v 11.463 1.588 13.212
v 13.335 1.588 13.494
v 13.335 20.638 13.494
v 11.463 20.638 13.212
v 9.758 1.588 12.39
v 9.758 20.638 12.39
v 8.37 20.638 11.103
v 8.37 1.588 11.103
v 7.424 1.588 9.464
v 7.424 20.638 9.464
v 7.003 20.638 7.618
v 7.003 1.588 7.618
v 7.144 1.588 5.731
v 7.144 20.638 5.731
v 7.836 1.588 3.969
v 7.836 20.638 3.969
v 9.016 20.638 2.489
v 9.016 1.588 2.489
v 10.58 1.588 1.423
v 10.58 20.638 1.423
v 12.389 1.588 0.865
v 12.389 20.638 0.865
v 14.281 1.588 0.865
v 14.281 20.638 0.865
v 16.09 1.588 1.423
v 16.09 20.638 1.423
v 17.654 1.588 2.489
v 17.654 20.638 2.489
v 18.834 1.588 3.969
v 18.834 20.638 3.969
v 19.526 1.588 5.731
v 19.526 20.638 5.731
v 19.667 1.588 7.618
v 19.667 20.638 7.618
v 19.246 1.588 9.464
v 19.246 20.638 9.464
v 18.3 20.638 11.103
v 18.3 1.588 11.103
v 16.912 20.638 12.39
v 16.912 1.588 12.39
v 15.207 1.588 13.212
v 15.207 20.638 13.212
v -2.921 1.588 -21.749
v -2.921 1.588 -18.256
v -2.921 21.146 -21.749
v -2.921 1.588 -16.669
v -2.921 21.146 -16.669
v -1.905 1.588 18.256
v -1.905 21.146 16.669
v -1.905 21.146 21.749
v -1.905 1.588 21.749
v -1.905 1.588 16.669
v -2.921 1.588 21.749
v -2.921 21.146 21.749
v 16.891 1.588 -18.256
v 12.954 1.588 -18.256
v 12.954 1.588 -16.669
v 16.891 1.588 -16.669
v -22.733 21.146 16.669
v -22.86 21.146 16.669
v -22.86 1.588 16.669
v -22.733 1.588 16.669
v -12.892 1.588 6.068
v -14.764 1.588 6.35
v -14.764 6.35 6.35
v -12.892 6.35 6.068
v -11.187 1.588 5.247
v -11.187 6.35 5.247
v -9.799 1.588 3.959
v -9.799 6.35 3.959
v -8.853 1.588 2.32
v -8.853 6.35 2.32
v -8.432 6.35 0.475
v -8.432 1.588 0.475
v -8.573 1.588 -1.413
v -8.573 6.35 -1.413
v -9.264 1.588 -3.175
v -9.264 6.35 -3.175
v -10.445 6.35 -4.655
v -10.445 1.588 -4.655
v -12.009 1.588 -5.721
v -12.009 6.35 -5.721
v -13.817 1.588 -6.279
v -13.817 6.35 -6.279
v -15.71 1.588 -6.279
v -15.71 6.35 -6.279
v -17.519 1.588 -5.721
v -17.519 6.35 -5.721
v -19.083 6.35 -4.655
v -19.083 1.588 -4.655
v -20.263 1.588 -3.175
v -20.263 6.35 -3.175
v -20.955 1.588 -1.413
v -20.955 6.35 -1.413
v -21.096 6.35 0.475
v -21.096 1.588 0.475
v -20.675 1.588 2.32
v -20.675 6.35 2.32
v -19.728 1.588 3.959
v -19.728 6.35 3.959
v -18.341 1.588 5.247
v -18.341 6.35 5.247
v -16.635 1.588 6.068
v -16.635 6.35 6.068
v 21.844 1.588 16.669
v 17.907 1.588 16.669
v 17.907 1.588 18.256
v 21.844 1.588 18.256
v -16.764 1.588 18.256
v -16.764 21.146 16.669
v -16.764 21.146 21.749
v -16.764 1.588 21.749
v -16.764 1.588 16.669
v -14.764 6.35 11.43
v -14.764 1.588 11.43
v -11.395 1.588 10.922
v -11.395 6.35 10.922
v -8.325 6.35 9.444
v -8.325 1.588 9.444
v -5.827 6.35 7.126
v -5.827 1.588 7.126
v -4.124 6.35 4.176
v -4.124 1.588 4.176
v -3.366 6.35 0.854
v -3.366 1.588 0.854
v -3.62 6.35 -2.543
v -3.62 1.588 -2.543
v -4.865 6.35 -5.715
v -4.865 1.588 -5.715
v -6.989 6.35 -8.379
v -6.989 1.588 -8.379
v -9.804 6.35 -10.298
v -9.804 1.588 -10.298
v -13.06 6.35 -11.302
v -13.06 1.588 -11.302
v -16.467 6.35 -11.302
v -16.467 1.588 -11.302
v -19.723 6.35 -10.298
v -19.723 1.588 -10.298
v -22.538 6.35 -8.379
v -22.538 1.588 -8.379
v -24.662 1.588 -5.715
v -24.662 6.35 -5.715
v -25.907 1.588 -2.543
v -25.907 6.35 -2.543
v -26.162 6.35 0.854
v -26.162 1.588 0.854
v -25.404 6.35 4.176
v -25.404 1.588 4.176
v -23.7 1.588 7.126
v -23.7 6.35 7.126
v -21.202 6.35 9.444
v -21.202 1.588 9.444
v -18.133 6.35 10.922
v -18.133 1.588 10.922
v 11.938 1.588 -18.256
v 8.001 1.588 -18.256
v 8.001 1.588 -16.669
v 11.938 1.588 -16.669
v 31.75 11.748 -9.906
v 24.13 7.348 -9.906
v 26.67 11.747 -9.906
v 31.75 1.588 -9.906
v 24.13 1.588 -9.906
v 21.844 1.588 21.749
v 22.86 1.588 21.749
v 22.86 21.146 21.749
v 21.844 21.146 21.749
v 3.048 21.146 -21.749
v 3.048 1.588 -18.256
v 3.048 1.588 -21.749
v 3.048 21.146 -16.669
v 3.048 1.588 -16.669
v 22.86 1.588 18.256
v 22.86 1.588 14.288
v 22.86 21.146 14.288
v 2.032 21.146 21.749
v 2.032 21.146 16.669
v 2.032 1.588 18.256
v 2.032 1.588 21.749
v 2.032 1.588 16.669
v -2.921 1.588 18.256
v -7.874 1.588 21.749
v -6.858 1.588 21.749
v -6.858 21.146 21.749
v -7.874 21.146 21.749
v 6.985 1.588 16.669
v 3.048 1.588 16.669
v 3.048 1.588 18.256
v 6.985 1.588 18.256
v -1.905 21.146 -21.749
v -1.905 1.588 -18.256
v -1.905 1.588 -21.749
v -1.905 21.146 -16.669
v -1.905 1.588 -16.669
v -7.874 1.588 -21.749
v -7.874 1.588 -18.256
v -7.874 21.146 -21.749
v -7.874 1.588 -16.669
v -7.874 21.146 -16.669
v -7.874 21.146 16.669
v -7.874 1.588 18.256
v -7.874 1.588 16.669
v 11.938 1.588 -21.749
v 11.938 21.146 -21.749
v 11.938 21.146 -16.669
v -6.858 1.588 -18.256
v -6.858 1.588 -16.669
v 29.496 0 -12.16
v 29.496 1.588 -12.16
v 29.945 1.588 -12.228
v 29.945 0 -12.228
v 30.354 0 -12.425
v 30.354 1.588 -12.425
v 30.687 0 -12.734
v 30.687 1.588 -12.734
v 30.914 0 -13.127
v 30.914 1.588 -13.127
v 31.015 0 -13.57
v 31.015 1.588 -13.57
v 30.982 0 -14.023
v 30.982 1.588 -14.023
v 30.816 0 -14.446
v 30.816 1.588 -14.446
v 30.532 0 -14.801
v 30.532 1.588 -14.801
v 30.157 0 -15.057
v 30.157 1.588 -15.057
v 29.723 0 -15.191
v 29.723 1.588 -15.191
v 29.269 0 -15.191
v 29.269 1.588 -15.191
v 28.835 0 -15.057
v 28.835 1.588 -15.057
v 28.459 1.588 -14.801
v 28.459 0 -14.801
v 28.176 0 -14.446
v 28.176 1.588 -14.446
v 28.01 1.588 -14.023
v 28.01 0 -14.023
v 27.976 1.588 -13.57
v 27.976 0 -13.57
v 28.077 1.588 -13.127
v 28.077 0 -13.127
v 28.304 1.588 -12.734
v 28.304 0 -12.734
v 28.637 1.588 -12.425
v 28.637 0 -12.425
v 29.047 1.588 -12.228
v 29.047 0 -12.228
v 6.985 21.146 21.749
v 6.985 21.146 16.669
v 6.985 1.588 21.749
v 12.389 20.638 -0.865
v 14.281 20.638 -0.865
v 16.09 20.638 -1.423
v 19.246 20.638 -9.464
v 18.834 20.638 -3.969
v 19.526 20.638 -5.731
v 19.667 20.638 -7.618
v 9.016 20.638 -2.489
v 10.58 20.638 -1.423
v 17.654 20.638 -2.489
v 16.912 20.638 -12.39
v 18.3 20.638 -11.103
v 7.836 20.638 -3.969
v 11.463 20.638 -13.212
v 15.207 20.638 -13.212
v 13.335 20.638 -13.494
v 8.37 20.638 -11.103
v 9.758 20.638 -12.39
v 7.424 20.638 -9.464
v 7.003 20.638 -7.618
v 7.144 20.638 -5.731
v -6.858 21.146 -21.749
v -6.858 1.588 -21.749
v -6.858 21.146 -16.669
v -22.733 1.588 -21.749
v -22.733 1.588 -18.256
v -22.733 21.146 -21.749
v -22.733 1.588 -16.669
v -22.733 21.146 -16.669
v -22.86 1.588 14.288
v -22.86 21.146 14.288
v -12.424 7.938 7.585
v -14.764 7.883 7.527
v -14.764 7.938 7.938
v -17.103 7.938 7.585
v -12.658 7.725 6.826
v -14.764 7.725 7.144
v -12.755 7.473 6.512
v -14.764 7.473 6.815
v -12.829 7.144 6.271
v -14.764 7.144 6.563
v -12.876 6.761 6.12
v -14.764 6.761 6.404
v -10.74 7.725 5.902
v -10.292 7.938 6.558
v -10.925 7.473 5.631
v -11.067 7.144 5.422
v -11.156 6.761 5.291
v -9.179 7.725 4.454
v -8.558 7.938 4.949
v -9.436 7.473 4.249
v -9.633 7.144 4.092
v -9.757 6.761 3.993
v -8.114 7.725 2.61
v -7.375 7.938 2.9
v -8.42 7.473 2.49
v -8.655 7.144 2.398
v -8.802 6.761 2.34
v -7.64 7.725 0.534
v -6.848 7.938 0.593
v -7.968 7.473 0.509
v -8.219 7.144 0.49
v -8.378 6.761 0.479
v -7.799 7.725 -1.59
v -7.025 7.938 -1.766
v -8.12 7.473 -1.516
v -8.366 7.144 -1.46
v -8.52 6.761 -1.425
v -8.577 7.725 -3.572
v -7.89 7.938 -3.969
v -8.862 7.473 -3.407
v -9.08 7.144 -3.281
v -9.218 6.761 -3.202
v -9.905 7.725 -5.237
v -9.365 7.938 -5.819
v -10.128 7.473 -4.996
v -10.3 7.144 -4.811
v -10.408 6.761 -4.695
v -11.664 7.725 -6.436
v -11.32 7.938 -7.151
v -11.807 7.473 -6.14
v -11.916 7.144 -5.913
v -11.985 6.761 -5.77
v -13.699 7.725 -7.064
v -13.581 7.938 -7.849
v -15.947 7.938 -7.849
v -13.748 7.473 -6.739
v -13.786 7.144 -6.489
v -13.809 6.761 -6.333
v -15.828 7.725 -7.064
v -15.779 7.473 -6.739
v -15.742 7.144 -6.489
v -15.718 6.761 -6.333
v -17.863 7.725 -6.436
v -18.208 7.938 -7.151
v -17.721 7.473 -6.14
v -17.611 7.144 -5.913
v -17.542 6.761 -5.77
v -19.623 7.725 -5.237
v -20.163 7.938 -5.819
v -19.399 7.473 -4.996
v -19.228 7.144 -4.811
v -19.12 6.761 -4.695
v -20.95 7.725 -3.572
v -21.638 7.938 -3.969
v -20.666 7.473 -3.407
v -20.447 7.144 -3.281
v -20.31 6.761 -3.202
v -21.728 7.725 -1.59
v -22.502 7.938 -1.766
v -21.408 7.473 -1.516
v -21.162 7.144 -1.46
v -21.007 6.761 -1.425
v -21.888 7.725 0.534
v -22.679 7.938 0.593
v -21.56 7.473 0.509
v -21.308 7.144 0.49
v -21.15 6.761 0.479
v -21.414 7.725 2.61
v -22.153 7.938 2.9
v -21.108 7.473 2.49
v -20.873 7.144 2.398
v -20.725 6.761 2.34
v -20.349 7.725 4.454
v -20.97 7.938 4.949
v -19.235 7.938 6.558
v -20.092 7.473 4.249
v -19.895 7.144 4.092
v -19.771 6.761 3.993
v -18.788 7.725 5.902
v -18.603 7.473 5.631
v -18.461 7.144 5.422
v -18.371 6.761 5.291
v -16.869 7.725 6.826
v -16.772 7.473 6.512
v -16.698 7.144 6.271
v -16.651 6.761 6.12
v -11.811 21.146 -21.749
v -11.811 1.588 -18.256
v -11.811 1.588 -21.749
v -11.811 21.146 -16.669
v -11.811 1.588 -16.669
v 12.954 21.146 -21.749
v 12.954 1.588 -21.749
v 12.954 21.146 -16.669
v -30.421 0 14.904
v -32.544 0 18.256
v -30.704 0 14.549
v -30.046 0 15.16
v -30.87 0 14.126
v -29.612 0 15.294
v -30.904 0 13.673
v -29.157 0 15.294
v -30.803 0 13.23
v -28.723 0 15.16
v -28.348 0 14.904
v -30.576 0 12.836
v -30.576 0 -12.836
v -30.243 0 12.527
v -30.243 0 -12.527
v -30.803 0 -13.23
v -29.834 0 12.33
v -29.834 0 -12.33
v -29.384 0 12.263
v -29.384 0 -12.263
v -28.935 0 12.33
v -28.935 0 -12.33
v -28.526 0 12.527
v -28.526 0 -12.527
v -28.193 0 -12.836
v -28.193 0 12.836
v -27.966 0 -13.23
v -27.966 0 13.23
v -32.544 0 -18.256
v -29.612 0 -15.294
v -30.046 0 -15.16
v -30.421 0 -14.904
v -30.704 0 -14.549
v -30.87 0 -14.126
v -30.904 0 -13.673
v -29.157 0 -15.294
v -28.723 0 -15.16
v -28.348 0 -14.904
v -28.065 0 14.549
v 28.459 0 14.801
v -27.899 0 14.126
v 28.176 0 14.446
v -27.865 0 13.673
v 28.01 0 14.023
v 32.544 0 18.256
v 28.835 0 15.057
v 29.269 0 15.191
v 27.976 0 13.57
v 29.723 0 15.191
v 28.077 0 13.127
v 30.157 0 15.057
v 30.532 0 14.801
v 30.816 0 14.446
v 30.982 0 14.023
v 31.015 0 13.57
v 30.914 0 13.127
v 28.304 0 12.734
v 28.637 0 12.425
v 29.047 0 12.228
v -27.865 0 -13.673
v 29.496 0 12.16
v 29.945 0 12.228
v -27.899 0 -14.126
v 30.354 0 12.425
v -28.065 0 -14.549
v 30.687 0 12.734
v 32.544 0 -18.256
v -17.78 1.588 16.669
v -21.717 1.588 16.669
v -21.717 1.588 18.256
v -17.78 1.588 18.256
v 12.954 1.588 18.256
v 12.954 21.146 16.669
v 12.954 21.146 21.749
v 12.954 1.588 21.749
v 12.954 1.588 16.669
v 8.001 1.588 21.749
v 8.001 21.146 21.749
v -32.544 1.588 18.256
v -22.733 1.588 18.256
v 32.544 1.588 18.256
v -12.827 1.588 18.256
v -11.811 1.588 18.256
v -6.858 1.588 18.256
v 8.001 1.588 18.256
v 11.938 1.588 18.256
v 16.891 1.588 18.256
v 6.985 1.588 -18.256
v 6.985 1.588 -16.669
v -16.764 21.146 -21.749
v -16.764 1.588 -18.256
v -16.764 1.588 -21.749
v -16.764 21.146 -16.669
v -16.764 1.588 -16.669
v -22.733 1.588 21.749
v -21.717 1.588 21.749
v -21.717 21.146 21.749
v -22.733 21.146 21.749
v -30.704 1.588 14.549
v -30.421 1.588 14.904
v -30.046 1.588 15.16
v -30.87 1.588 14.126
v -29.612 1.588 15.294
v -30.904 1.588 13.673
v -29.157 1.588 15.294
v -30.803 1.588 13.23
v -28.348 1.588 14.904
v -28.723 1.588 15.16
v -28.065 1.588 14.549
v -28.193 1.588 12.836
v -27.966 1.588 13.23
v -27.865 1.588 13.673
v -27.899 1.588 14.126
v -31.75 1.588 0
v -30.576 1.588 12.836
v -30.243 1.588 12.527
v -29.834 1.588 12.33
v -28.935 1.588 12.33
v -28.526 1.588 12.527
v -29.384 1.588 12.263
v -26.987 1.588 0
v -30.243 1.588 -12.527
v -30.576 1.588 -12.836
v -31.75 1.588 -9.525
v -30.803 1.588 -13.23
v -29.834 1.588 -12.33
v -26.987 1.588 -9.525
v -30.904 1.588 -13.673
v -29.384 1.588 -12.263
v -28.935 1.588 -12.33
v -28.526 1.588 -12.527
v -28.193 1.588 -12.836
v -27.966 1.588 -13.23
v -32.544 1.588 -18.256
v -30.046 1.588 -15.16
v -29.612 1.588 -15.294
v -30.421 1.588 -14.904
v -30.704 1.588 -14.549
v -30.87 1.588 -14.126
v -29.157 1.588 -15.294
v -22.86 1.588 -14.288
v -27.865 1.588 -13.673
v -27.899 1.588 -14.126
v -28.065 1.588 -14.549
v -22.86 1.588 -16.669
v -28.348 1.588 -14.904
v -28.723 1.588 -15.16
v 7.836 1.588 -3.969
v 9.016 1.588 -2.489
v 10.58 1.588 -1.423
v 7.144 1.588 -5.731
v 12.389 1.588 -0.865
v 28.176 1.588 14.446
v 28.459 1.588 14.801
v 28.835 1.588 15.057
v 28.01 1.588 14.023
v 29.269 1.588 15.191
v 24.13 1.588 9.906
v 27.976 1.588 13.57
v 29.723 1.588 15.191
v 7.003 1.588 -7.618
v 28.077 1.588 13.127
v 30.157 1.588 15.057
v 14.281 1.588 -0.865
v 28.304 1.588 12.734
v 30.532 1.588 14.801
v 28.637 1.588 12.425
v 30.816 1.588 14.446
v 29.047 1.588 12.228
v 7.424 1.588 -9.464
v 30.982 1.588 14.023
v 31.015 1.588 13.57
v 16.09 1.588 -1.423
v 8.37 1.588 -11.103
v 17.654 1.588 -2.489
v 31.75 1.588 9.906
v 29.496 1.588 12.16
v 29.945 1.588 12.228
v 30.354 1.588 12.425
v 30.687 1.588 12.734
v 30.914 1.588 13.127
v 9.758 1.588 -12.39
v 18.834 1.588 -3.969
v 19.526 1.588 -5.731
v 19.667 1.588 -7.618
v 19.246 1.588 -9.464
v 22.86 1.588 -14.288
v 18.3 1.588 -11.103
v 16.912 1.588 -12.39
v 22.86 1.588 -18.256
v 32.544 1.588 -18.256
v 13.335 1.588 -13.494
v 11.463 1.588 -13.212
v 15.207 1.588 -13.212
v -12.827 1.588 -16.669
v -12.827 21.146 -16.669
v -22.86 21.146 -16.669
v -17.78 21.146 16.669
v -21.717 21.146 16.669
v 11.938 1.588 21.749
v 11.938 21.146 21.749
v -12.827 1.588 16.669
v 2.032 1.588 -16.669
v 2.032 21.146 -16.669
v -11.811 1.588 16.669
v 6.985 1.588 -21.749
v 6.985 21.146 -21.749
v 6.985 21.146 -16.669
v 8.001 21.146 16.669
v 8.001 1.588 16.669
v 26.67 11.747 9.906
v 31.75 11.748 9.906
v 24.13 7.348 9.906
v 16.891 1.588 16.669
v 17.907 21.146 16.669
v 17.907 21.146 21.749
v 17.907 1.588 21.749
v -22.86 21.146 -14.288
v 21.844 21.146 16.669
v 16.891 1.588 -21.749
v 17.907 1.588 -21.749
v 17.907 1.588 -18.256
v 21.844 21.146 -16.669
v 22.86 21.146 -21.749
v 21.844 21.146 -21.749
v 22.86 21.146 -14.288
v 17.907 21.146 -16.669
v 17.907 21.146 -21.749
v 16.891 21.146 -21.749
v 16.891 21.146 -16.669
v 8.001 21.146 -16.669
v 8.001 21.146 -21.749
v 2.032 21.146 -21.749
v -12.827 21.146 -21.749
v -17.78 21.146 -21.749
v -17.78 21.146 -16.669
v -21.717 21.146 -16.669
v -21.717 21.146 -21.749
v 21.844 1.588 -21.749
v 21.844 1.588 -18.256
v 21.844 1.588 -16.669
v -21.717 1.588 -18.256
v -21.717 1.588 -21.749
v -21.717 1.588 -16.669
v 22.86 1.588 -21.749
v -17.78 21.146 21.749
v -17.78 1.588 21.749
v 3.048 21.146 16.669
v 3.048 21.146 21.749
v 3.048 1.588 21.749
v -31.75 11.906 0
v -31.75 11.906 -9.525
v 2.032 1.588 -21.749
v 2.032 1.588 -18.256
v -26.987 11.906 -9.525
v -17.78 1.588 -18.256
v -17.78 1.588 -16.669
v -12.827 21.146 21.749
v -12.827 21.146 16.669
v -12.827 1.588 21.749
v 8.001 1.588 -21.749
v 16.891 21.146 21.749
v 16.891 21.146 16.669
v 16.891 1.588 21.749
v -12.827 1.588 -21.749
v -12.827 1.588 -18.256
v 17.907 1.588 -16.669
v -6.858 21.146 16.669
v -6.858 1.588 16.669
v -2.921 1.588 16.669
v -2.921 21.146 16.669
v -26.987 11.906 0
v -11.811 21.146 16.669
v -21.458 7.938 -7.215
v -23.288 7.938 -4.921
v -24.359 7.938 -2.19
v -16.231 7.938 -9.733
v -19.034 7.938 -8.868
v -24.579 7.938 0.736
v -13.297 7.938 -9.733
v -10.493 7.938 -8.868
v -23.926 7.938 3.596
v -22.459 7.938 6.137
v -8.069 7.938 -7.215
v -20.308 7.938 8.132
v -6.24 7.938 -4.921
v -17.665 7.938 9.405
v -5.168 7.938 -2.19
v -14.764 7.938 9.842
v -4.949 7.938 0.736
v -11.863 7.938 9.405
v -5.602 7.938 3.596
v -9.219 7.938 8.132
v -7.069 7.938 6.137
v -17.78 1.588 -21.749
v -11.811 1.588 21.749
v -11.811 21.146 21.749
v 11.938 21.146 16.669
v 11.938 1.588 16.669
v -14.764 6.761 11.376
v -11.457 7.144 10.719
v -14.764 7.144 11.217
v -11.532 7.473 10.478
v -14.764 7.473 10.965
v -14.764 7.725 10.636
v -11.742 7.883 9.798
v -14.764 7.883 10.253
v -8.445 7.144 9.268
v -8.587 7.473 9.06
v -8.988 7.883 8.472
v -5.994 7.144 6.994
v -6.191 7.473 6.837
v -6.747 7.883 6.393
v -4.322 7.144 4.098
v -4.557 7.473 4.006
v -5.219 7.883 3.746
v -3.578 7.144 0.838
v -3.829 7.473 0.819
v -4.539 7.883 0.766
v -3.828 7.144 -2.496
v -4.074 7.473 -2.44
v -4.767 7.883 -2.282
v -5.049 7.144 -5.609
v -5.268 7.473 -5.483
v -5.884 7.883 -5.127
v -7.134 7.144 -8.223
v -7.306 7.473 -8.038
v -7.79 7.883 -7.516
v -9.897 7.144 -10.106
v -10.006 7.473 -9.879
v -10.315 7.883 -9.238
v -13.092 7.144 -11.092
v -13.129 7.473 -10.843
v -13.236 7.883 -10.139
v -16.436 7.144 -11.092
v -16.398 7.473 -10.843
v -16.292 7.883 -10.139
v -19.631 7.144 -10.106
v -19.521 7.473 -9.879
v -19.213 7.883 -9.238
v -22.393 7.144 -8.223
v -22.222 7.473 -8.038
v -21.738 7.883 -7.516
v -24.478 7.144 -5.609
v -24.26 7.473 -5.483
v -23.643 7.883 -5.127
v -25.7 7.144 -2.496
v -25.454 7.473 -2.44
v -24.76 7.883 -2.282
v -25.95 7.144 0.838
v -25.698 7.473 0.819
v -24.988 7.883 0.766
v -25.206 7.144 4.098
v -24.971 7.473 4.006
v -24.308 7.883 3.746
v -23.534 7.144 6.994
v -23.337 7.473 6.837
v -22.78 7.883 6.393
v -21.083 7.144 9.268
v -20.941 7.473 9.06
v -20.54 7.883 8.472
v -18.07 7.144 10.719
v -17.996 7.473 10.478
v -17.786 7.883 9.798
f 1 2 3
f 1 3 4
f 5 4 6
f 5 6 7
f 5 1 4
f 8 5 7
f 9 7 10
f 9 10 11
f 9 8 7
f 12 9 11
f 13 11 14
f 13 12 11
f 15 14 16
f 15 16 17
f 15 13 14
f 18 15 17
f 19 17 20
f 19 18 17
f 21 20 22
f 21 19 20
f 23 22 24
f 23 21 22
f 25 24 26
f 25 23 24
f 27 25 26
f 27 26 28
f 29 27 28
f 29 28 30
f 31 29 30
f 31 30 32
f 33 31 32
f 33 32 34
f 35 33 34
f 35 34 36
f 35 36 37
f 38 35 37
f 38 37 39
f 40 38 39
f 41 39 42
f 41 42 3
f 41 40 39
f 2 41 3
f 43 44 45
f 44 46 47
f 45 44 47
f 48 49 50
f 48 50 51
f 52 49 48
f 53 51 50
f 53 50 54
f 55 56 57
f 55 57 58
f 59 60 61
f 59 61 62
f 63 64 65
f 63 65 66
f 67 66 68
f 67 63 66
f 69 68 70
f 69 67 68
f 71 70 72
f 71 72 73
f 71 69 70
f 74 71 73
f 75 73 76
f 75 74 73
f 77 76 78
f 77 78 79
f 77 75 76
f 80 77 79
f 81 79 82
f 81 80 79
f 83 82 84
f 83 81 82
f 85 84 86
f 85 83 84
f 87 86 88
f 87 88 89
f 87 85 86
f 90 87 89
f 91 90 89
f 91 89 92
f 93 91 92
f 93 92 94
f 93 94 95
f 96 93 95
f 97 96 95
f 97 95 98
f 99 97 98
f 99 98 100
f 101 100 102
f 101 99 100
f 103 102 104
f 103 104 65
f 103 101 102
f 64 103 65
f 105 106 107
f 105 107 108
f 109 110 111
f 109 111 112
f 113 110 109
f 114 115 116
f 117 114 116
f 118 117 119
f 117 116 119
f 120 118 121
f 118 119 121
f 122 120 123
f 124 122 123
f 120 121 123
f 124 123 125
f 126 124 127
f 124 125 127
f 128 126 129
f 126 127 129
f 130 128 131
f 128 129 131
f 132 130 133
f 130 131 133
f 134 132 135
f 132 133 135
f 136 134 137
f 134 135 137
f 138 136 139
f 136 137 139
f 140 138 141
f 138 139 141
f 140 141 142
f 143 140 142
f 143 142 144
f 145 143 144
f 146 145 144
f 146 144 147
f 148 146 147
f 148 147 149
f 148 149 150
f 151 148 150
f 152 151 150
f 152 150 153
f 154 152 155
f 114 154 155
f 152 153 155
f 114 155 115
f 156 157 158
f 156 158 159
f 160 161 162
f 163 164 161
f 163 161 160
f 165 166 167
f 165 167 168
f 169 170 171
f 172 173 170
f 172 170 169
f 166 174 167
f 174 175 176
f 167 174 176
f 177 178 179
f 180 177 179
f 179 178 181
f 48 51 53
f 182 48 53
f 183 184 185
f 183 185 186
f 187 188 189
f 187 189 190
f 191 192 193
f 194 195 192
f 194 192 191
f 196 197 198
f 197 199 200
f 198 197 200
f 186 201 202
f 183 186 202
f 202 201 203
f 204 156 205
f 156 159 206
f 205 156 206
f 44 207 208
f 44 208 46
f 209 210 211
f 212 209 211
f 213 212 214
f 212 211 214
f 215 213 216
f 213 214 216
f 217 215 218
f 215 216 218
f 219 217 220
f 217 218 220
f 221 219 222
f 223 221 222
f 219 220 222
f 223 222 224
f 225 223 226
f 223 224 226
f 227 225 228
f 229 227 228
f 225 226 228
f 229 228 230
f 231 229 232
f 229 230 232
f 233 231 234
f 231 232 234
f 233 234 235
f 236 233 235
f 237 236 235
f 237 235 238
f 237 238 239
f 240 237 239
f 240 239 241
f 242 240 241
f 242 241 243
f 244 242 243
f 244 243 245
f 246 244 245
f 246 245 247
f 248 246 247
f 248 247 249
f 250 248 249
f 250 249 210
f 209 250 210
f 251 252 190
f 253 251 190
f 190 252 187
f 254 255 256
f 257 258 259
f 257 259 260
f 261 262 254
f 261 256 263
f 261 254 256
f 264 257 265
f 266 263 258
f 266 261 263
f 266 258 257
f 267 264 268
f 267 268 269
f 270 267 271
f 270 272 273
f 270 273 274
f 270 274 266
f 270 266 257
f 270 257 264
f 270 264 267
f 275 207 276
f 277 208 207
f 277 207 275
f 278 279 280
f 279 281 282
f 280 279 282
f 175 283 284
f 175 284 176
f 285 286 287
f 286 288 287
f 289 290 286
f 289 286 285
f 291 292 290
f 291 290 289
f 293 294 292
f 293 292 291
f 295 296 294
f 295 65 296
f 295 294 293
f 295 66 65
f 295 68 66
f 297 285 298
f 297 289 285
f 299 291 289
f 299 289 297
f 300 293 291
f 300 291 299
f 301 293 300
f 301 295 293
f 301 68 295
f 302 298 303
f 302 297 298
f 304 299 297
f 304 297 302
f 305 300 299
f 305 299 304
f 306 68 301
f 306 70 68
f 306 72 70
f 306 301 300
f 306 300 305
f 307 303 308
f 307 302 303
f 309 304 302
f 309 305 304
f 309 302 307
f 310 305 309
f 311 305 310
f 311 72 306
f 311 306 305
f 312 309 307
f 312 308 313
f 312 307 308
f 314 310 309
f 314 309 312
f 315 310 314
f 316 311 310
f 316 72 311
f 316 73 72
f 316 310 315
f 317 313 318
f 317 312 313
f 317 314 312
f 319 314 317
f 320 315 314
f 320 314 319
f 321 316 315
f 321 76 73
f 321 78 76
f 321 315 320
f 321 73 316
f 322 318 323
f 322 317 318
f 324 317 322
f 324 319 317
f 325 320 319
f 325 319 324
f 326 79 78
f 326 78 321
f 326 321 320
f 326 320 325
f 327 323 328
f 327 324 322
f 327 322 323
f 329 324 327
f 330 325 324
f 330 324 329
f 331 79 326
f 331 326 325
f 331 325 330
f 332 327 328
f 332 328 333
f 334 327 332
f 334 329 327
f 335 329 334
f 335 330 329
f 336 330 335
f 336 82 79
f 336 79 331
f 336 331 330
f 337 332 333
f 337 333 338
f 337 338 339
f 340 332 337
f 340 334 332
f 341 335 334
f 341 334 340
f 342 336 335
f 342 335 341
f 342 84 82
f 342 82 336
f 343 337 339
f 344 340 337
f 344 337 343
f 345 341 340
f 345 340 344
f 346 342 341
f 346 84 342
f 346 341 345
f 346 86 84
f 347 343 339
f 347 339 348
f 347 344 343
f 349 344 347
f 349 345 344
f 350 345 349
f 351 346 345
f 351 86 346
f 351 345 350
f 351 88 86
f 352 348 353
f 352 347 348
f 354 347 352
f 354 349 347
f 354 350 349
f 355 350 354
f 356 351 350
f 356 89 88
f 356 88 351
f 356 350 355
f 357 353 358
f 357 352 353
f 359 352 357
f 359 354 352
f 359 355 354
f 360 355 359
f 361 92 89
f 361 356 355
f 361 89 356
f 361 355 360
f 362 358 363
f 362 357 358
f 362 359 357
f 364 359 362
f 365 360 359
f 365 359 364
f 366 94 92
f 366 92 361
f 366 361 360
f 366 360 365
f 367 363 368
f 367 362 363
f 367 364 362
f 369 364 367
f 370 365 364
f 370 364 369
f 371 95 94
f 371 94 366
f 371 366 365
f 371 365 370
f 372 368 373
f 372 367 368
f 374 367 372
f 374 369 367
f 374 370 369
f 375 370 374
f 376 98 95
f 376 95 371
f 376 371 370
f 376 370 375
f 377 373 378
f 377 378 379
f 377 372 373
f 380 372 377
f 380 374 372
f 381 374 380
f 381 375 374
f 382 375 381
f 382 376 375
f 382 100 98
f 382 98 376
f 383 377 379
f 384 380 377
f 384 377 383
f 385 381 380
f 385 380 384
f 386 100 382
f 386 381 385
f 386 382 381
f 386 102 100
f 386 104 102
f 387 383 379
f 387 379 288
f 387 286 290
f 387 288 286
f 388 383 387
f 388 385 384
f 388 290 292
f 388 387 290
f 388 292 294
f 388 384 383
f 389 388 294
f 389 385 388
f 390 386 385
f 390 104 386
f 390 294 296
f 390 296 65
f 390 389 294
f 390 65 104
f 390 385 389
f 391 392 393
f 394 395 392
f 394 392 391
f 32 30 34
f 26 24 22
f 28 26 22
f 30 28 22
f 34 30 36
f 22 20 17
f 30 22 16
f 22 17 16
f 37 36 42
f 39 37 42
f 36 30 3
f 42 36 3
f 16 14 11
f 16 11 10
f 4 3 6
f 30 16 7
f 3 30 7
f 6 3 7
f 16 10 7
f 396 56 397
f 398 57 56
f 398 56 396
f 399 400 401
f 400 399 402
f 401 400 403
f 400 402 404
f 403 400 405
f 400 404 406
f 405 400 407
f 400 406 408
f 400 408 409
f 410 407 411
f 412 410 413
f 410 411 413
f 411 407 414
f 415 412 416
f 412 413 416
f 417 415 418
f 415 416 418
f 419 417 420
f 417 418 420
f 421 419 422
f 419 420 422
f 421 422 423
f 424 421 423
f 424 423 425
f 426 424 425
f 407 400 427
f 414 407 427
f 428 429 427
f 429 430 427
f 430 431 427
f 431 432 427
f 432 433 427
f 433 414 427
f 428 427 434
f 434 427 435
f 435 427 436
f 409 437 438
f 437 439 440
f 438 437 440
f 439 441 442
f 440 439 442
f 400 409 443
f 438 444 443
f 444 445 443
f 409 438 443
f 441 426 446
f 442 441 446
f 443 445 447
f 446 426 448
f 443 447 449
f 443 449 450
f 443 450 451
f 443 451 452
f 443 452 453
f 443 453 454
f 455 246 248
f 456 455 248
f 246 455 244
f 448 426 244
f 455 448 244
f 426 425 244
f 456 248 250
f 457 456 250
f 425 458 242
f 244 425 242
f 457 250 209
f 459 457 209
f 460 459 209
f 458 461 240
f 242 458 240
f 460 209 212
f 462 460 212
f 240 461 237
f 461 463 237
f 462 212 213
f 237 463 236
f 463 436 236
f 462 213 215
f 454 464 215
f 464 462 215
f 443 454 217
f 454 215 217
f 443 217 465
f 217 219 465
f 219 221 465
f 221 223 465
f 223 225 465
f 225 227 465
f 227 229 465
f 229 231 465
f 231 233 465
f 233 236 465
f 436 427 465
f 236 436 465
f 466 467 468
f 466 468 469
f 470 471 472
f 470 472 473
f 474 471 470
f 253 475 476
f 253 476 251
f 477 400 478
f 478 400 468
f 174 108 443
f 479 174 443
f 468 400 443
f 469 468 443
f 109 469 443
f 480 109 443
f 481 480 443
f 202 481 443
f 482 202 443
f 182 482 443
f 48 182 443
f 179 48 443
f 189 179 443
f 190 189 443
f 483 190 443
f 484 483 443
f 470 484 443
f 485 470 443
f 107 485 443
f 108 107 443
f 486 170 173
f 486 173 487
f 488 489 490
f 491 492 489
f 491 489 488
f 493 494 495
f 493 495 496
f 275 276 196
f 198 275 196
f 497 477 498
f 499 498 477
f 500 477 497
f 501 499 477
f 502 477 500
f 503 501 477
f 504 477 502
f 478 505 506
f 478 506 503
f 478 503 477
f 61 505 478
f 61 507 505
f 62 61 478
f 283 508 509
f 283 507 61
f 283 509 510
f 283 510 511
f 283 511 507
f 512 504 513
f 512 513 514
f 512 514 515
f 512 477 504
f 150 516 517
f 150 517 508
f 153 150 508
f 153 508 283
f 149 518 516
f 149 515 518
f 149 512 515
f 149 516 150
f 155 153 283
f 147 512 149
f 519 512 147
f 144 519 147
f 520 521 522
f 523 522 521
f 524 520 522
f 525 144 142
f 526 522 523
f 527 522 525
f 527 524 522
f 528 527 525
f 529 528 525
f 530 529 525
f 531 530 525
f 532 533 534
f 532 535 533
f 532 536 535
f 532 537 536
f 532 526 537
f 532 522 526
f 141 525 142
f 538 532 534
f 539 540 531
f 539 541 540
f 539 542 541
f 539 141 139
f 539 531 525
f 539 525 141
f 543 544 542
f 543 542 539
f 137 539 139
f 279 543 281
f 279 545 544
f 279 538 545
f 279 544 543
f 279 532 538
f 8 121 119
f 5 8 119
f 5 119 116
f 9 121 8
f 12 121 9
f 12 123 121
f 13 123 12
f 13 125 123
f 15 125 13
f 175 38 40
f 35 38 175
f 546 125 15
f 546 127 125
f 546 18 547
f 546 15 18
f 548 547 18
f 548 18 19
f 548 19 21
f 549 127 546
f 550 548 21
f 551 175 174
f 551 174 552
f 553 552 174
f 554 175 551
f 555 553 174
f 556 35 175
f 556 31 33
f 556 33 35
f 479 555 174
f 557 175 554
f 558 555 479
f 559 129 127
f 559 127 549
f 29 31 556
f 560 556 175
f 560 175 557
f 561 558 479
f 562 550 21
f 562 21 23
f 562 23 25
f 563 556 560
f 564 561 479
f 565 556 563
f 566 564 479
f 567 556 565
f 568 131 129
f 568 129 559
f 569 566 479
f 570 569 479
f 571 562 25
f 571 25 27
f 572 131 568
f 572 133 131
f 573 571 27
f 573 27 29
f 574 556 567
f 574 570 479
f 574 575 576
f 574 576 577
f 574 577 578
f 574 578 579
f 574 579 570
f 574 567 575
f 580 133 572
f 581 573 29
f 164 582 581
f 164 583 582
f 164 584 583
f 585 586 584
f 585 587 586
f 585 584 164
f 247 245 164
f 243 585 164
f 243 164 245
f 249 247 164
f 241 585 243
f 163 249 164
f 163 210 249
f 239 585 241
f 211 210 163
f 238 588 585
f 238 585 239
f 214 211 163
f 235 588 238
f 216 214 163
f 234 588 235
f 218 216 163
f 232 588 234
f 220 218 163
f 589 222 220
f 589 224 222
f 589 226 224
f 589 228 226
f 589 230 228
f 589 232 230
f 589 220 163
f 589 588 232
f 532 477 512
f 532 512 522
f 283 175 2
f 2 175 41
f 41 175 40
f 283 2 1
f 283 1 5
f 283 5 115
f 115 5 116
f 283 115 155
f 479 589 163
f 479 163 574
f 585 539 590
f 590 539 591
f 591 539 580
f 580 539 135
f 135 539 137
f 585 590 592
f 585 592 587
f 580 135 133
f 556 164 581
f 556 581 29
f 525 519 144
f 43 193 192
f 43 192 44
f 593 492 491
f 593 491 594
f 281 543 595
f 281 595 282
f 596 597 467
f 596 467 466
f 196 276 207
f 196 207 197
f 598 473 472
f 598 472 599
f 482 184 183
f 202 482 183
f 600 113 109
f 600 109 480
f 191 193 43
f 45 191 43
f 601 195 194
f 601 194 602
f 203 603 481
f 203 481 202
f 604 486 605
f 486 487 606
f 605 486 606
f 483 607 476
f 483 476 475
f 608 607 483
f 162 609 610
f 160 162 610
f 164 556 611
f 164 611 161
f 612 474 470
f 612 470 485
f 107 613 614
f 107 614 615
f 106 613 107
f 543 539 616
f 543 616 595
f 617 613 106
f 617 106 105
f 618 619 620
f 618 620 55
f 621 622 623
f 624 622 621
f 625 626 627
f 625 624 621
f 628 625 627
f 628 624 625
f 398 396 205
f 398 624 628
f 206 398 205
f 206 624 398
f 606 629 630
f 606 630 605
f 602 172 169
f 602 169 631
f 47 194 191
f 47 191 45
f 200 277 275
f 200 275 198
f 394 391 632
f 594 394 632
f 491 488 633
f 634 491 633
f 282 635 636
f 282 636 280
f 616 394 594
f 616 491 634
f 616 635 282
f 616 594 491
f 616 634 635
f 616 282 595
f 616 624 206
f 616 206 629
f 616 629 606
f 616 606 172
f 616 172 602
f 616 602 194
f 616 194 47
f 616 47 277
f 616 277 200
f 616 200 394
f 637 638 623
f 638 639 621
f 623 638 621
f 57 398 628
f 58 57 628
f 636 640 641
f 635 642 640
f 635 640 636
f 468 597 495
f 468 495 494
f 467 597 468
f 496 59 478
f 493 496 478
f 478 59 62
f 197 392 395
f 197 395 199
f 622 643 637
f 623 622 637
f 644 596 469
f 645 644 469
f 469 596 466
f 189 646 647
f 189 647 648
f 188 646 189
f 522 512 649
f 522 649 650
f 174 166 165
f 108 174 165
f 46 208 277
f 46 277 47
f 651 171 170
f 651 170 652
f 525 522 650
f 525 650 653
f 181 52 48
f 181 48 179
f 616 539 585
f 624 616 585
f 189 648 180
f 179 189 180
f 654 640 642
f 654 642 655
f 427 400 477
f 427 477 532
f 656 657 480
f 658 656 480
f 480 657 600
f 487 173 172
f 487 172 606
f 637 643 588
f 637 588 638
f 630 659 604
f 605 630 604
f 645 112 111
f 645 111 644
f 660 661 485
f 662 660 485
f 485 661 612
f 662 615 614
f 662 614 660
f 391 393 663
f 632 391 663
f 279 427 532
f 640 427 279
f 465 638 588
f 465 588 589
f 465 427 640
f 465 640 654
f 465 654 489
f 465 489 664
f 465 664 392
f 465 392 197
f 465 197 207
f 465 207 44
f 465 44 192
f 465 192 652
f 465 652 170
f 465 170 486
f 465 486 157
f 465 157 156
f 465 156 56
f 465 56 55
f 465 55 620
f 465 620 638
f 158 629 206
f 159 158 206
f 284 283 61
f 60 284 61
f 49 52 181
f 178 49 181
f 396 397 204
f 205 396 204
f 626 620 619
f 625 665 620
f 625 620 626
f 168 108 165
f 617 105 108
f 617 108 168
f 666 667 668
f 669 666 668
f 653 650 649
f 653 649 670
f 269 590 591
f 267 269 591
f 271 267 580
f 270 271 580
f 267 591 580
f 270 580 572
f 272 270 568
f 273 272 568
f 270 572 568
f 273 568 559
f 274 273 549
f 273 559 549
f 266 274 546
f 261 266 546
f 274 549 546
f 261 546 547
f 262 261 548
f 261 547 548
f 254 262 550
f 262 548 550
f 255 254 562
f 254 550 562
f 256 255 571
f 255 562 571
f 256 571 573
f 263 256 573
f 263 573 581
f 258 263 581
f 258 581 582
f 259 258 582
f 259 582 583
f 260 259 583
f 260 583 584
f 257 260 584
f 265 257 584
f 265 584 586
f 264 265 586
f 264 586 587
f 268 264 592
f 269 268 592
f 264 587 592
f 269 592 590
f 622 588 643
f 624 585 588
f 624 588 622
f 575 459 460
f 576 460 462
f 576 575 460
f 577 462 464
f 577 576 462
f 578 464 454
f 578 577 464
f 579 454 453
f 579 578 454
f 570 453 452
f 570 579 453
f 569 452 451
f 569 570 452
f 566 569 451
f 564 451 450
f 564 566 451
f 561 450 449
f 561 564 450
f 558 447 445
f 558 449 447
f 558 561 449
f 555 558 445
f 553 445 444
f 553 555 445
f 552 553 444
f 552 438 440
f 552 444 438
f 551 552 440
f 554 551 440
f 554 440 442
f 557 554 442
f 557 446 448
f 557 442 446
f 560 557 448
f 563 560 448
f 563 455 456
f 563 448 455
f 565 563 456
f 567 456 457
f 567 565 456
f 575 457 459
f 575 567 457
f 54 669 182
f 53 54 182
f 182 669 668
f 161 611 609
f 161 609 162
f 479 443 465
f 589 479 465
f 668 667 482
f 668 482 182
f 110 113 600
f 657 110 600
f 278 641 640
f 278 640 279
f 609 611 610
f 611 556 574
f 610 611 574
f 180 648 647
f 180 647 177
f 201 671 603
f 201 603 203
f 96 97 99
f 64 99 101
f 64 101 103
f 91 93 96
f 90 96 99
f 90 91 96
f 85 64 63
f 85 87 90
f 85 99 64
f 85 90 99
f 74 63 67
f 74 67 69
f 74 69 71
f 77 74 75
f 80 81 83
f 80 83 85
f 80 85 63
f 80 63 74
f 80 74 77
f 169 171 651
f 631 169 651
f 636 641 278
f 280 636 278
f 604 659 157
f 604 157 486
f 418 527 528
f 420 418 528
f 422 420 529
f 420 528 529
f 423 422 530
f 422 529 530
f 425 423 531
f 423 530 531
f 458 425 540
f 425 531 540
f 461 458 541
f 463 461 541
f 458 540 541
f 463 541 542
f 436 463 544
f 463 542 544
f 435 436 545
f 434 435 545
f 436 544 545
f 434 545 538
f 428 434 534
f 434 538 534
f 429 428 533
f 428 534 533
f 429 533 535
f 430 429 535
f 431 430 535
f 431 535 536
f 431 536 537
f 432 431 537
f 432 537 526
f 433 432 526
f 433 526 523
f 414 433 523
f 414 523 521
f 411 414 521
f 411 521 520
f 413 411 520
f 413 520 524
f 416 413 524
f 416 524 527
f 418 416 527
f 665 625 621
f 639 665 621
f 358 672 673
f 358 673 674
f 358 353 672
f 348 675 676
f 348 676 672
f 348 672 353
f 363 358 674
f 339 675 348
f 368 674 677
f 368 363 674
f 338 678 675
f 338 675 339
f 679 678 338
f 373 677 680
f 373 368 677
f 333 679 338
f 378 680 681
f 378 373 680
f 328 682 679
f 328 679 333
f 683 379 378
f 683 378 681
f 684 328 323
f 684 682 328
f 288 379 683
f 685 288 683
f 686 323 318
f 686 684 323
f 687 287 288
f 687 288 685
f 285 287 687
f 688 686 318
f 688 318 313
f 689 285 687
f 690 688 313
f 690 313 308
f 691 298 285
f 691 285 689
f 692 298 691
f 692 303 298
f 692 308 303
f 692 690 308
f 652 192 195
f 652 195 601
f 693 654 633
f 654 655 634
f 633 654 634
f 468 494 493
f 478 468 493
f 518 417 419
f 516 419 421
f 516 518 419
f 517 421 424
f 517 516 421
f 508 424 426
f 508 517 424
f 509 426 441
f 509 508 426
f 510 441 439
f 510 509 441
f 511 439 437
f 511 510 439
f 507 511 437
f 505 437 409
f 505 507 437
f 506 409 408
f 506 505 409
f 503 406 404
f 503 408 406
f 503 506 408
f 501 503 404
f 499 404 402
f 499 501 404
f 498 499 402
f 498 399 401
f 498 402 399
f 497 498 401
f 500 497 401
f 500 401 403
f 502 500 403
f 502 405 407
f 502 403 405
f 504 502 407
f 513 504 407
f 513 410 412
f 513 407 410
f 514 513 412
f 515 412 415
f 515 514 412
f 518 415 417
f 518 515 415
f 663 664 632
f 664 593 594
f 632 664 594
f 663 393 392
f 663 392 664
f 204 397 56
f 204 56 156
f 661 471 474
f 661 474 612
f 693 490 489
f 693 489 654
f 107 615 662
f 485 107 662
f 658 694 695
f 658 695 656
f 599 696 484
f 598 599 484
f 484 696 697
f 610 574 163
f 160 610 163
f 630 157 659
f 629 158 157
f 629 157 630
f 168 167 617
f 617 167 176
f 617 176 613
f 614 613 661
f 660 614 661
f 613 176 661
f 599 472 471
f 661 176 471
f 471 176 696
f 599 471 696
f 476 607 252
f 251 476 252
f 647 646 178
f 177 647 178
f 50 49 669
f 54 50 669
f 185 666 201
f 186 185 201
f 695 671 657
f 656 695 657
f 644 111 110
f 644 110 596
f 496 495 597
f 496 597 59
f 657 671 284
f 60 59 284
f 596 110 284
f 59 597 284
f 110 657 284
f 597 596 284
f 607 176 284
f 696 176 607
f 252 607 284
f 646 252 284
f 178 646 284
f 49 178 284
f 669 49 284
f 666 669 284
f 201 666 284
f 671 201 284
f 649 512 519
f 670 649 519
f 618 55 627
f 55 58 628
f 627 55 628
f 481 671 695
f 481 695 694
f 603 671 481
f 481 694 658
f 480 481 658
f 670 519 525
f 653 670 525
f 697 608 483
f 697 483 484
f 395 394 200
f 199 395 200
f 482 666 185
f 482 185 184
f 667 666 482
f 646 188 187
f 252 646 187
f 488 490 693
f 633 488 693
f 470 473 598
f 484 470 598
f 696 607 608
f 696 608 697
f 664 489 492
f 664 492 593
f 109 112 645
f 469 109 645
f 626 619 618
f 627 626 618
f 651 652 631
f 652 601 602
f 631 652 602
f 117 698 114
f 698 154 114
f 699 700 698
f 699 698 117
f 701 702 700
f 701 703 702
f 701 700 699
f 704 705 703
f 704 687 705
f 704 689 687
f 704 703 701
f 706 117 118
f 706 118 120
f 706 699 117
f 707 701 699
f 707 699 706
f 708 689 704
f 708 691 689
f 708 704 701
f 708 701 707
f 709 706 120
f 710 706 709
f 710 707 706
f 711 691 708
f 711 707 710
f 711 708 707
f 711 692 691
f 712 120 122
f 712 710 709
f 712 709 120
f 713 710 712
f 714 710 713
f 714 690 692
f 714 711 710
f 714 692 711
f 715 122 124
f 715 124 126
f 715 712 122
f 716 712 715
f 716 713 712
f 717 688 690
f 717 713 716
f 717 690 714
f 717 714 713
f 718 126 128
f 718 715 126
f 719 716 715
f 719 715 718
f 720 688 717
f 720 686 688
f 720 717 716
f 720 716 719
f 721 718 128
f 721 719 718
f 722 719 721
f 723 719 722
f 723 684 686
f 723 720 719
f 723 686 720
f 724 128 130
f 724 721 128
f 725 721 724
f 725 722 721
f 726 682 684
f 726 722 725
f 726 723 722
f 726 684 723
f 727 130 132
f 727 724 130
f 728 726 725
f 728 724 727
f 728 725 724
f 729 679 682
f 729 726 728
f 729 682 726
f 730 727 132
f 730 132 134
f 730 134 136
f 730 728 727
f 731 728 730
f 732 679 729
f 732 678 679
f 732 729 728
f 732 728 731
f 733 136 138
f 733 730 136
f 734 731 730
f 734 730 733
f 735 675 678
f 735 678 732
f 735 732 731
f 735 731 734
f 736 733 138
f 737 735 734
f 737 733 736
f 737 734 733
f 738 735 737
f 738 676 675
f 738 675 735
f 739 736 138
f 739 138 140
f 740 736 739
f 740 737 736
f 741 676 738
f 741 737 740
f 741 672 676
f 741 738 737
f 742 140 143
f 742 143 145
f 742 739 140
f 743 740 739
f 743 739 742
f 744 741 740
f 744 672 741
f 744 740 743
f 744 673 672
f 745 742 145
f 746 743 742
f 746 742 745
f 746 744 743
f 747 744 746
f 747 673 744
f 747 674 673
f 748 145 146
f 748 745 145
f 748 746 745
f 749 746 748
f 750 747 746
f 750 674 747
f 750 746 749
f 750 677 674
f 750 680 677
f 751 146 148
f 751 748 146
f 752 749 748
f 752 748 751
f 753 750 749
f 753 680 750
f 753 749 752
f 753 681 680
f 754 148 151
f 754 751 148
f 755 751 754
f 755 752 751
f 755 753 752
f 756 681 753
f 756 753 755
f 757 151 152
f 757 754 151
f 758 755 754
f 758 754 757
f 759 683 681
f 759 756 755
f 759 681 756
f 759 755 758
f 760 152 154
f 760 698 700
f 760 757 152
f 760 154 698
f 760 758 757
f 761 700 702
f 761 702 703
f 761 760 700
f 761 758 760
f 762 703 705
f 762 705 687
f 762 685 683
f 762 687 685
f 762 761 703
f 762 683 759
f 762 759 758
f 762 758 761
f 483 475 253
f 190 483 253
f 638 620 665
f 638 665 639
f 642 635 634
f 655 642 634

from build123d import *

# Parameters (mm, degrees)
SKETCH1_W               = 65.0875
SKETCH1_H               = 36.5125
BOSS_EXTRUDE1_DEPTH     = 1.5875
SKETCH2_W               = 45.72
SKETCH2_H               = 2.38125
BOSS_EXTRUDE2_DEPTH     = 19.558
SKETCH3_W               = 1.016
SKETCH3_H               = 19.558
BOSS_EXTRUDE3_DEPTH     = 5.08
LPATTERN1_COUNT         = 10
LPATTERN1_PITCH         = 4.953
SKETCH4_R               = 6.35
BOSS_EXTRUDE4_DEPTH     = 19.05
SKETCH5_R               = 1.524
CUT_EXTRUDE1_DEPTH      = 19.05
MIRROR1_COPY_1_SKETCH_W = 1.016
MIRROR1_COPY_1_SKETCH_H = 19.558
MIRROR1_COPY_1_DEPTH    = 5.08
MIRROR1_COPY_2_SKETCH_W = 1.016
MIRROR1_COPY_2_SKETCH_H = 19.558
MIRROR1_COPY_2_DEPTH    = 5.08
MIRROR1_COPY_3_SKETCH_W = 1.016
MIRROR1_COPY_3_SKETCH_H = 19.558
MIRROR1_COPY_3_DEPTH    = 5.08
MIRROR1_COPY_4_SKETCH_W = 1.016
MIRROR1_COPY_4_SKETCH_H = 19.558
MIRROR1_COPY_4_DEPTH    = 5.08
MIRROR1_COPY_5_SKETCH_W = 1.016
MIRROR1_COPY_5_SKETCH_H = 19.558
MIRROR1_COPY_5_DEPTH    = 5.08
MIRROR1_COPY_6_SKETCH_W = 1.016
MIRROR1_COPY_6_SKETCH_H = 19.558
MIRROR1_COPY_6_DEPTH    = 5.08
MIRROR1_COPY_7_SKETCH_W = 1.016
MIRROR1_COPY_7_SKETCH_H = 19.558
MIRROR1_COPY_7_DEPTH    = 5.08
MIRROR1_COPY_8_SKETCH_W = 1.016
MIRROR1_COPY_8_SKETCH_H = 19.558
MIRROR1_COPY_8_DEPTH    = 5.08
MIRROR1_COPY_9_SKETCH_W = 1.016
MIRROR1_COPY_9_SKETCH_H = 19.558
MIRROR1_COPY_9_DEPTH    = 5.08
SKETCH6_R               = 11.43
SKETCH6_R_2             = 6.35
BOSS_EXTRUDE5_DEPTH     = 6.35
FILLET1_R               = 1.5875
SKETCH7_W               = 7.62
SKETCH7_H               = 19.812
BOSS_EXTRUDE6_DEPTH     = 10.16
CHAMFER1_SIZE           = 2.54
CHAMFER1_SIZE2          = 4.399409051
SKETCH8_W               = 4.7625
SKETCH8_H               = 9.525
BOSS_EXTRUDE7_DEPTH     = 10.31875


with BuildPart() as part:
    # Sketch1 → Boss-Extrude1 (new body)
    with BuildSketch(Plane(origin=(0, 0, 0), x_dir=(1, 0, 0), z_dir=(0, 1, 0))):
        Rectangle(SKETCH1_W, SKETCH1_H)
    extrude(amount=BOSS_EXTRUDE1_DEPTH)

    # Sketch2 → Boss-Extrude2 (add)
    with BuildSketch(Plane(origin=(0, 1.5875, 0), x_dir=(1, 0, 0), z_dir=(0, 1, 0))):
        with Locations((0, 15.478125)):
            Rectangle(SKETCH2_W, SKETCH2_H)
    boss_extrude2 = extrude(amount=BOSS_EXTRUDE2_DEPTH)

    # Sketch3 → Boss-Extrude3 (add)
    with BuildSketch(Plane(origin=(0, 0, -16.66875), x_dir=(-1, 0, 0), z_dir=(0, 0, -1))):
        with Locations((-22.352, 11.3665)):
            Rectangle(SKETCH3_W, SKETCH3_H)
    boss_extrude3 = extrude(amount=BOSS_EXTRUDE3_DEPTH)

    # LPattern1: Boss-Extrude3 ×10
    with Locations(*[(-i * LPATTERN1_PITCH, 0, 0) for i in range(1, LPATTERN1_COUNT)]):
        add(boss_extrude3)

    # Sketch4 → Boss-Extrude4 (add)
    with BuildSketch(Plane(origin=(0, 1.5875, 0), x_dir=(1, 0, 0), z_dir=(0, 1, 0))):
        with Locations(Location((13.335, 7.14375, 0), (0, 0, 90))):
            Circle(SKETCH4_R)
    boss_extrude4 = extrude(amount=BOSS_EXTRUDE4_DEPTH)

    # Sketch5 → Cut-Extrude1 (cut)
    with BuildSketch(Plane(origin=(0, 1.5875, 0), x_dir=(1, 0, 0), z_dir=(0, 1, 0))):
        with Locations(Location((29.49575, 13.68425, 0), (0, 0, 270))):
            Circle(SKETCH5_R)
        with Locations(Location((-29.384474521, 13.78665039, 0), (0, 0, 270))):
            Circle(SKETCH5_R)
    cut_extrude1 = extrude(amount=-CUT_EXTRUDE1_DEPTH, mode=Mode.SUBTRACT)

    # Mirror1: Boss-Extrude2, Boss-Extrude3, Boss-Extrude4, Cut-Extrude1 across plane
    add(boss_extrude2.mirror(Plane.XY))
    add(boss_extrude3.mirror(Plane.XY))
    add(boss_extrude4.mirror(Plane.XY))
    add(cut_extrude1.mirror(Plane.XY), mode=Mode.SUBTRACT)

    # Mirror1 copy 1 sketch → Mirror1 copy 1 (add)
    with BuildSketch(Plane(origin=(-4.953, 0, 16.66875), x_dir=(-1, 0, 0), z_dir=(0, 0, 1))):
        with Locations((-22.352, -11.3665)):
            Rectangle(MIRROR1_COPY_1_SKETCH_W, MIRROR1_COPY_1_SKETCH_H)
    extrude(amount=MIRROR1_COPY_1_DEPTH)

    # Mirror1 copy 2 sketch → Mirror1 copy 2 (add)
    with BuildSketch(Plane(origin=(-9.906, 0, 16.66875), x_dir=(-1, 0, 0), z_dir=(0, 0, 1))):
        with Locations((-22.352, -11.3665)):
            Rectangle(MIRROR1_COPY_2_SKETCH_W, MIRROR1_COPY_2_SKETCH_H)
    extrude(amount=MIRROR1_COPY_2_DEPTH)

    # Mirror1 copy 3 sketch → Mirror1 copy 3 (add)
    with BuildSketch(Plane(origin=(-14.859, 0, 16.66875), x_dir=(-1, 0, 0), z_dir=(0, 0, 1))):
        with Locations((-22.352, -11.3665)):
            Rectangle(MIRROR1_COPY_3_SKETCH_W, MIRROR1_COPY_3_SKETCH_H)
    extrude(amount=MIRROR1_COPY_3_DEPTH)

    # Mirror1 copy 4 sketch → Mirror1 copy 4 (add)
    with BuildSketch(Plane(origin=(-19.812, 0, 16.66875), x_dir=(-1, 0, 0), z_dir=(0, 0, 1))):
        with Locations((-22.352, -11.3665)):
            Rectangle(MIRROR1_COPY_4_SKETCH_W, MIRROR1_COPY_4_SKETCH_H)
    extrude(amount=MIRROR1_COPY_4_DEPTH)

    # Mirror1 copy 5 sketch → Mirror1 copy 5 (add)
    with BuildSketch(Plane(origin=(-24.765, 0, 16.66875), x_dir=(-1, 0, 0), z_dir=(0, 0, 1))):
        with Locations((-22.352, -11.3665)):
            Rectangle(MIRROR1_COPY_5_SKETCH_W, MIRROR1_COPY_5_SKETCH_H)
    extrude(amount=MIRROR1_COPY_5_DEPTH)

    # Mirror1 copy 6 sketch → Mirror1 copy 6 (add)
    with BuildSketch(Plane(origin=(-29.718, 0, 16.66875), x_dir=(-1, 0, 0), z_dir=(0, 0, 1))):
        with Locations((-22.352, -11.3665)):
            Rectangle(MIRROR1_COPY_6_SKETCH_W, MIRROR1_COPY_6_SKETCH_H)
    extrude(amount=MIRROR1_COPY_6_DEPTH)

    # Mirror1 copy 7 sketch → Mirror1 copy 7 (add)
    with BuildSketch(Plane(origin=(-34.671, 0, 16.66875), x_dir=(-1, 0, 0), z_dir=(0, 0, 1))):
        with Locations((-22.352, -11.3665)):
            Rectangle(MIRROR1_COPY_7_SKETCH_W, MIRROR1_COPY_7_SKETCH_H)
    extrude(amount=MIRROR1_COPY_7_DEPTH)

    # Mirror1 copy 8 sketch → Mirror1 copy 8 (add)
    with BuildSketch(Plane(origin=(-39.624, 0, 16.66875), x_dir=(-1, 0, 0), z_dir=(0, 0, 1))):
        with Locations((-22.352, -11.3665)):
            Rectangle(MIRROR1_COPY_8_SKETCH_W, MIRROR1_COPY_8_SKETCH_H)
    extrude(amount=MIRROR1_COPY_8_DEPTH)

    # Mirror1 copy 9 sketch → Mirror1 copy 9 (add)
    with BuildSketch(Plane(origin=(-44.577, 0, 16.66875), x_dir=(-1, 0, 0), z_dir=(0, 0, 1))):
        with Locations((-22.352, -11.3665)):
            Rectangle(MIRROR1_COPY_9_SKETCH_W, MIRROR1_COPY_9_SKETCH_H)
    extrude(amount=MIRROR1_COPY_9_DEPTH)

    # Sketch6 → Boss-Extrude5 (add)
    with BuildSketch(Plane(origin=(0, 1.5875, 0), x_dir=(1, 0, 0), z_dir=(0, 1, 0))):
        with Locations(Location((-14.76375, 0, 0), (0, 0, 270))):
            Circle(SKETCH6_R)
        with Locations(Location((-14.76375, 0, 0), (0, 0, 270))):
            Circle(SKETCH6_R_2, mode=Mode.SUBTRACT)
    extrude(amount=BOSS_EXTRUDE5_DEPTH)

    # Fillet1
    fillet1_edges = [part.edges().sort_by_distance(p)[0] for p in [
        (-14.76375, 7.9375, -11.43),
        (-14.76375, 7.9375, -6.35),
    ]]
    fillet(fillet1_edges, radius=FILLET1_R)

    # Sketch7 → Boss-Extrude6 (add)
    with BuildSketch(Plane(origin=(0, 1.5875, 0), x_dir=(1, 0, 0), z_dir=(0, 1, 0))):
        with Locations((27.94, 0)):
            Rectangle(SKETCH7_W, SKETCH7_H)
    extrude(amount=BOSS_EXTRUDE6_DEPTH)

    # Chamfer1
    chamfer1_edges = [part.edges().sort_by_distance(p)[0] for p in [
        (24.13, 11.7475, 0),
    ]]
    chamfer1_side = [part.faces().sort_by_distance(p)[0] for p in [
        (27.94, 11.7475, 0),
    ]]
    chamfer(chamfer1_edges, length=CHAMFER1_SIZE, length2=CHAMFER1_SIZE2, reference=chamfer1_side[0])

    # Sketch8 → Boss-Extrude7 (add)
    with BuildSketch(Plane(origin=(0, 1.5875, 0), x_dir=(1, 0, 0), z_dir=(0, 1, 0))):
        with Locations((-29.36875, 4.7625)):
            Rectangle(SKETCH8_W, SKETCH8_H)
    extrude(amount=BOSS_EXTRUDE7_DEPTH)


solid = part.part
